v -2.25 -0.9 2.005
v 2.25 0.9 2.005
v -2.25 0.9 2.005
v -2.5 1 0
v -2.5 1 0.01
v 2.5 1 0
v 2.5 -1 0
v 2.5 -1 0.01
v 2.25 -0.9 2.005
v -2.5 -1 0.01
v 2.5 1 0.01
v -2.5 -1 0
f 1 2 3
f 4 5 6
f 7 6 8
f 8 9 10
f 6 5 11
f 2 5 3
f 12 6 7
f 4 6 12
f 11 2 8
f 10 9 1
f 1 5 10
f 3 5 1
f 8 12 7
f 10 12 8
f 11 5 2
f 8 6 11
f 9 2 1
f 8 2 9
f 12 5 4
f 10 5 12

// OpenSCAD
eps=0.01;

module generator() {
	hull() {
		translate([0,0,eps/2]) cube([5,2,eps], center=true);
		translate([0,0,2]) cube([.9*5,.9*2,eps], center=true);
	}
}

generator();
